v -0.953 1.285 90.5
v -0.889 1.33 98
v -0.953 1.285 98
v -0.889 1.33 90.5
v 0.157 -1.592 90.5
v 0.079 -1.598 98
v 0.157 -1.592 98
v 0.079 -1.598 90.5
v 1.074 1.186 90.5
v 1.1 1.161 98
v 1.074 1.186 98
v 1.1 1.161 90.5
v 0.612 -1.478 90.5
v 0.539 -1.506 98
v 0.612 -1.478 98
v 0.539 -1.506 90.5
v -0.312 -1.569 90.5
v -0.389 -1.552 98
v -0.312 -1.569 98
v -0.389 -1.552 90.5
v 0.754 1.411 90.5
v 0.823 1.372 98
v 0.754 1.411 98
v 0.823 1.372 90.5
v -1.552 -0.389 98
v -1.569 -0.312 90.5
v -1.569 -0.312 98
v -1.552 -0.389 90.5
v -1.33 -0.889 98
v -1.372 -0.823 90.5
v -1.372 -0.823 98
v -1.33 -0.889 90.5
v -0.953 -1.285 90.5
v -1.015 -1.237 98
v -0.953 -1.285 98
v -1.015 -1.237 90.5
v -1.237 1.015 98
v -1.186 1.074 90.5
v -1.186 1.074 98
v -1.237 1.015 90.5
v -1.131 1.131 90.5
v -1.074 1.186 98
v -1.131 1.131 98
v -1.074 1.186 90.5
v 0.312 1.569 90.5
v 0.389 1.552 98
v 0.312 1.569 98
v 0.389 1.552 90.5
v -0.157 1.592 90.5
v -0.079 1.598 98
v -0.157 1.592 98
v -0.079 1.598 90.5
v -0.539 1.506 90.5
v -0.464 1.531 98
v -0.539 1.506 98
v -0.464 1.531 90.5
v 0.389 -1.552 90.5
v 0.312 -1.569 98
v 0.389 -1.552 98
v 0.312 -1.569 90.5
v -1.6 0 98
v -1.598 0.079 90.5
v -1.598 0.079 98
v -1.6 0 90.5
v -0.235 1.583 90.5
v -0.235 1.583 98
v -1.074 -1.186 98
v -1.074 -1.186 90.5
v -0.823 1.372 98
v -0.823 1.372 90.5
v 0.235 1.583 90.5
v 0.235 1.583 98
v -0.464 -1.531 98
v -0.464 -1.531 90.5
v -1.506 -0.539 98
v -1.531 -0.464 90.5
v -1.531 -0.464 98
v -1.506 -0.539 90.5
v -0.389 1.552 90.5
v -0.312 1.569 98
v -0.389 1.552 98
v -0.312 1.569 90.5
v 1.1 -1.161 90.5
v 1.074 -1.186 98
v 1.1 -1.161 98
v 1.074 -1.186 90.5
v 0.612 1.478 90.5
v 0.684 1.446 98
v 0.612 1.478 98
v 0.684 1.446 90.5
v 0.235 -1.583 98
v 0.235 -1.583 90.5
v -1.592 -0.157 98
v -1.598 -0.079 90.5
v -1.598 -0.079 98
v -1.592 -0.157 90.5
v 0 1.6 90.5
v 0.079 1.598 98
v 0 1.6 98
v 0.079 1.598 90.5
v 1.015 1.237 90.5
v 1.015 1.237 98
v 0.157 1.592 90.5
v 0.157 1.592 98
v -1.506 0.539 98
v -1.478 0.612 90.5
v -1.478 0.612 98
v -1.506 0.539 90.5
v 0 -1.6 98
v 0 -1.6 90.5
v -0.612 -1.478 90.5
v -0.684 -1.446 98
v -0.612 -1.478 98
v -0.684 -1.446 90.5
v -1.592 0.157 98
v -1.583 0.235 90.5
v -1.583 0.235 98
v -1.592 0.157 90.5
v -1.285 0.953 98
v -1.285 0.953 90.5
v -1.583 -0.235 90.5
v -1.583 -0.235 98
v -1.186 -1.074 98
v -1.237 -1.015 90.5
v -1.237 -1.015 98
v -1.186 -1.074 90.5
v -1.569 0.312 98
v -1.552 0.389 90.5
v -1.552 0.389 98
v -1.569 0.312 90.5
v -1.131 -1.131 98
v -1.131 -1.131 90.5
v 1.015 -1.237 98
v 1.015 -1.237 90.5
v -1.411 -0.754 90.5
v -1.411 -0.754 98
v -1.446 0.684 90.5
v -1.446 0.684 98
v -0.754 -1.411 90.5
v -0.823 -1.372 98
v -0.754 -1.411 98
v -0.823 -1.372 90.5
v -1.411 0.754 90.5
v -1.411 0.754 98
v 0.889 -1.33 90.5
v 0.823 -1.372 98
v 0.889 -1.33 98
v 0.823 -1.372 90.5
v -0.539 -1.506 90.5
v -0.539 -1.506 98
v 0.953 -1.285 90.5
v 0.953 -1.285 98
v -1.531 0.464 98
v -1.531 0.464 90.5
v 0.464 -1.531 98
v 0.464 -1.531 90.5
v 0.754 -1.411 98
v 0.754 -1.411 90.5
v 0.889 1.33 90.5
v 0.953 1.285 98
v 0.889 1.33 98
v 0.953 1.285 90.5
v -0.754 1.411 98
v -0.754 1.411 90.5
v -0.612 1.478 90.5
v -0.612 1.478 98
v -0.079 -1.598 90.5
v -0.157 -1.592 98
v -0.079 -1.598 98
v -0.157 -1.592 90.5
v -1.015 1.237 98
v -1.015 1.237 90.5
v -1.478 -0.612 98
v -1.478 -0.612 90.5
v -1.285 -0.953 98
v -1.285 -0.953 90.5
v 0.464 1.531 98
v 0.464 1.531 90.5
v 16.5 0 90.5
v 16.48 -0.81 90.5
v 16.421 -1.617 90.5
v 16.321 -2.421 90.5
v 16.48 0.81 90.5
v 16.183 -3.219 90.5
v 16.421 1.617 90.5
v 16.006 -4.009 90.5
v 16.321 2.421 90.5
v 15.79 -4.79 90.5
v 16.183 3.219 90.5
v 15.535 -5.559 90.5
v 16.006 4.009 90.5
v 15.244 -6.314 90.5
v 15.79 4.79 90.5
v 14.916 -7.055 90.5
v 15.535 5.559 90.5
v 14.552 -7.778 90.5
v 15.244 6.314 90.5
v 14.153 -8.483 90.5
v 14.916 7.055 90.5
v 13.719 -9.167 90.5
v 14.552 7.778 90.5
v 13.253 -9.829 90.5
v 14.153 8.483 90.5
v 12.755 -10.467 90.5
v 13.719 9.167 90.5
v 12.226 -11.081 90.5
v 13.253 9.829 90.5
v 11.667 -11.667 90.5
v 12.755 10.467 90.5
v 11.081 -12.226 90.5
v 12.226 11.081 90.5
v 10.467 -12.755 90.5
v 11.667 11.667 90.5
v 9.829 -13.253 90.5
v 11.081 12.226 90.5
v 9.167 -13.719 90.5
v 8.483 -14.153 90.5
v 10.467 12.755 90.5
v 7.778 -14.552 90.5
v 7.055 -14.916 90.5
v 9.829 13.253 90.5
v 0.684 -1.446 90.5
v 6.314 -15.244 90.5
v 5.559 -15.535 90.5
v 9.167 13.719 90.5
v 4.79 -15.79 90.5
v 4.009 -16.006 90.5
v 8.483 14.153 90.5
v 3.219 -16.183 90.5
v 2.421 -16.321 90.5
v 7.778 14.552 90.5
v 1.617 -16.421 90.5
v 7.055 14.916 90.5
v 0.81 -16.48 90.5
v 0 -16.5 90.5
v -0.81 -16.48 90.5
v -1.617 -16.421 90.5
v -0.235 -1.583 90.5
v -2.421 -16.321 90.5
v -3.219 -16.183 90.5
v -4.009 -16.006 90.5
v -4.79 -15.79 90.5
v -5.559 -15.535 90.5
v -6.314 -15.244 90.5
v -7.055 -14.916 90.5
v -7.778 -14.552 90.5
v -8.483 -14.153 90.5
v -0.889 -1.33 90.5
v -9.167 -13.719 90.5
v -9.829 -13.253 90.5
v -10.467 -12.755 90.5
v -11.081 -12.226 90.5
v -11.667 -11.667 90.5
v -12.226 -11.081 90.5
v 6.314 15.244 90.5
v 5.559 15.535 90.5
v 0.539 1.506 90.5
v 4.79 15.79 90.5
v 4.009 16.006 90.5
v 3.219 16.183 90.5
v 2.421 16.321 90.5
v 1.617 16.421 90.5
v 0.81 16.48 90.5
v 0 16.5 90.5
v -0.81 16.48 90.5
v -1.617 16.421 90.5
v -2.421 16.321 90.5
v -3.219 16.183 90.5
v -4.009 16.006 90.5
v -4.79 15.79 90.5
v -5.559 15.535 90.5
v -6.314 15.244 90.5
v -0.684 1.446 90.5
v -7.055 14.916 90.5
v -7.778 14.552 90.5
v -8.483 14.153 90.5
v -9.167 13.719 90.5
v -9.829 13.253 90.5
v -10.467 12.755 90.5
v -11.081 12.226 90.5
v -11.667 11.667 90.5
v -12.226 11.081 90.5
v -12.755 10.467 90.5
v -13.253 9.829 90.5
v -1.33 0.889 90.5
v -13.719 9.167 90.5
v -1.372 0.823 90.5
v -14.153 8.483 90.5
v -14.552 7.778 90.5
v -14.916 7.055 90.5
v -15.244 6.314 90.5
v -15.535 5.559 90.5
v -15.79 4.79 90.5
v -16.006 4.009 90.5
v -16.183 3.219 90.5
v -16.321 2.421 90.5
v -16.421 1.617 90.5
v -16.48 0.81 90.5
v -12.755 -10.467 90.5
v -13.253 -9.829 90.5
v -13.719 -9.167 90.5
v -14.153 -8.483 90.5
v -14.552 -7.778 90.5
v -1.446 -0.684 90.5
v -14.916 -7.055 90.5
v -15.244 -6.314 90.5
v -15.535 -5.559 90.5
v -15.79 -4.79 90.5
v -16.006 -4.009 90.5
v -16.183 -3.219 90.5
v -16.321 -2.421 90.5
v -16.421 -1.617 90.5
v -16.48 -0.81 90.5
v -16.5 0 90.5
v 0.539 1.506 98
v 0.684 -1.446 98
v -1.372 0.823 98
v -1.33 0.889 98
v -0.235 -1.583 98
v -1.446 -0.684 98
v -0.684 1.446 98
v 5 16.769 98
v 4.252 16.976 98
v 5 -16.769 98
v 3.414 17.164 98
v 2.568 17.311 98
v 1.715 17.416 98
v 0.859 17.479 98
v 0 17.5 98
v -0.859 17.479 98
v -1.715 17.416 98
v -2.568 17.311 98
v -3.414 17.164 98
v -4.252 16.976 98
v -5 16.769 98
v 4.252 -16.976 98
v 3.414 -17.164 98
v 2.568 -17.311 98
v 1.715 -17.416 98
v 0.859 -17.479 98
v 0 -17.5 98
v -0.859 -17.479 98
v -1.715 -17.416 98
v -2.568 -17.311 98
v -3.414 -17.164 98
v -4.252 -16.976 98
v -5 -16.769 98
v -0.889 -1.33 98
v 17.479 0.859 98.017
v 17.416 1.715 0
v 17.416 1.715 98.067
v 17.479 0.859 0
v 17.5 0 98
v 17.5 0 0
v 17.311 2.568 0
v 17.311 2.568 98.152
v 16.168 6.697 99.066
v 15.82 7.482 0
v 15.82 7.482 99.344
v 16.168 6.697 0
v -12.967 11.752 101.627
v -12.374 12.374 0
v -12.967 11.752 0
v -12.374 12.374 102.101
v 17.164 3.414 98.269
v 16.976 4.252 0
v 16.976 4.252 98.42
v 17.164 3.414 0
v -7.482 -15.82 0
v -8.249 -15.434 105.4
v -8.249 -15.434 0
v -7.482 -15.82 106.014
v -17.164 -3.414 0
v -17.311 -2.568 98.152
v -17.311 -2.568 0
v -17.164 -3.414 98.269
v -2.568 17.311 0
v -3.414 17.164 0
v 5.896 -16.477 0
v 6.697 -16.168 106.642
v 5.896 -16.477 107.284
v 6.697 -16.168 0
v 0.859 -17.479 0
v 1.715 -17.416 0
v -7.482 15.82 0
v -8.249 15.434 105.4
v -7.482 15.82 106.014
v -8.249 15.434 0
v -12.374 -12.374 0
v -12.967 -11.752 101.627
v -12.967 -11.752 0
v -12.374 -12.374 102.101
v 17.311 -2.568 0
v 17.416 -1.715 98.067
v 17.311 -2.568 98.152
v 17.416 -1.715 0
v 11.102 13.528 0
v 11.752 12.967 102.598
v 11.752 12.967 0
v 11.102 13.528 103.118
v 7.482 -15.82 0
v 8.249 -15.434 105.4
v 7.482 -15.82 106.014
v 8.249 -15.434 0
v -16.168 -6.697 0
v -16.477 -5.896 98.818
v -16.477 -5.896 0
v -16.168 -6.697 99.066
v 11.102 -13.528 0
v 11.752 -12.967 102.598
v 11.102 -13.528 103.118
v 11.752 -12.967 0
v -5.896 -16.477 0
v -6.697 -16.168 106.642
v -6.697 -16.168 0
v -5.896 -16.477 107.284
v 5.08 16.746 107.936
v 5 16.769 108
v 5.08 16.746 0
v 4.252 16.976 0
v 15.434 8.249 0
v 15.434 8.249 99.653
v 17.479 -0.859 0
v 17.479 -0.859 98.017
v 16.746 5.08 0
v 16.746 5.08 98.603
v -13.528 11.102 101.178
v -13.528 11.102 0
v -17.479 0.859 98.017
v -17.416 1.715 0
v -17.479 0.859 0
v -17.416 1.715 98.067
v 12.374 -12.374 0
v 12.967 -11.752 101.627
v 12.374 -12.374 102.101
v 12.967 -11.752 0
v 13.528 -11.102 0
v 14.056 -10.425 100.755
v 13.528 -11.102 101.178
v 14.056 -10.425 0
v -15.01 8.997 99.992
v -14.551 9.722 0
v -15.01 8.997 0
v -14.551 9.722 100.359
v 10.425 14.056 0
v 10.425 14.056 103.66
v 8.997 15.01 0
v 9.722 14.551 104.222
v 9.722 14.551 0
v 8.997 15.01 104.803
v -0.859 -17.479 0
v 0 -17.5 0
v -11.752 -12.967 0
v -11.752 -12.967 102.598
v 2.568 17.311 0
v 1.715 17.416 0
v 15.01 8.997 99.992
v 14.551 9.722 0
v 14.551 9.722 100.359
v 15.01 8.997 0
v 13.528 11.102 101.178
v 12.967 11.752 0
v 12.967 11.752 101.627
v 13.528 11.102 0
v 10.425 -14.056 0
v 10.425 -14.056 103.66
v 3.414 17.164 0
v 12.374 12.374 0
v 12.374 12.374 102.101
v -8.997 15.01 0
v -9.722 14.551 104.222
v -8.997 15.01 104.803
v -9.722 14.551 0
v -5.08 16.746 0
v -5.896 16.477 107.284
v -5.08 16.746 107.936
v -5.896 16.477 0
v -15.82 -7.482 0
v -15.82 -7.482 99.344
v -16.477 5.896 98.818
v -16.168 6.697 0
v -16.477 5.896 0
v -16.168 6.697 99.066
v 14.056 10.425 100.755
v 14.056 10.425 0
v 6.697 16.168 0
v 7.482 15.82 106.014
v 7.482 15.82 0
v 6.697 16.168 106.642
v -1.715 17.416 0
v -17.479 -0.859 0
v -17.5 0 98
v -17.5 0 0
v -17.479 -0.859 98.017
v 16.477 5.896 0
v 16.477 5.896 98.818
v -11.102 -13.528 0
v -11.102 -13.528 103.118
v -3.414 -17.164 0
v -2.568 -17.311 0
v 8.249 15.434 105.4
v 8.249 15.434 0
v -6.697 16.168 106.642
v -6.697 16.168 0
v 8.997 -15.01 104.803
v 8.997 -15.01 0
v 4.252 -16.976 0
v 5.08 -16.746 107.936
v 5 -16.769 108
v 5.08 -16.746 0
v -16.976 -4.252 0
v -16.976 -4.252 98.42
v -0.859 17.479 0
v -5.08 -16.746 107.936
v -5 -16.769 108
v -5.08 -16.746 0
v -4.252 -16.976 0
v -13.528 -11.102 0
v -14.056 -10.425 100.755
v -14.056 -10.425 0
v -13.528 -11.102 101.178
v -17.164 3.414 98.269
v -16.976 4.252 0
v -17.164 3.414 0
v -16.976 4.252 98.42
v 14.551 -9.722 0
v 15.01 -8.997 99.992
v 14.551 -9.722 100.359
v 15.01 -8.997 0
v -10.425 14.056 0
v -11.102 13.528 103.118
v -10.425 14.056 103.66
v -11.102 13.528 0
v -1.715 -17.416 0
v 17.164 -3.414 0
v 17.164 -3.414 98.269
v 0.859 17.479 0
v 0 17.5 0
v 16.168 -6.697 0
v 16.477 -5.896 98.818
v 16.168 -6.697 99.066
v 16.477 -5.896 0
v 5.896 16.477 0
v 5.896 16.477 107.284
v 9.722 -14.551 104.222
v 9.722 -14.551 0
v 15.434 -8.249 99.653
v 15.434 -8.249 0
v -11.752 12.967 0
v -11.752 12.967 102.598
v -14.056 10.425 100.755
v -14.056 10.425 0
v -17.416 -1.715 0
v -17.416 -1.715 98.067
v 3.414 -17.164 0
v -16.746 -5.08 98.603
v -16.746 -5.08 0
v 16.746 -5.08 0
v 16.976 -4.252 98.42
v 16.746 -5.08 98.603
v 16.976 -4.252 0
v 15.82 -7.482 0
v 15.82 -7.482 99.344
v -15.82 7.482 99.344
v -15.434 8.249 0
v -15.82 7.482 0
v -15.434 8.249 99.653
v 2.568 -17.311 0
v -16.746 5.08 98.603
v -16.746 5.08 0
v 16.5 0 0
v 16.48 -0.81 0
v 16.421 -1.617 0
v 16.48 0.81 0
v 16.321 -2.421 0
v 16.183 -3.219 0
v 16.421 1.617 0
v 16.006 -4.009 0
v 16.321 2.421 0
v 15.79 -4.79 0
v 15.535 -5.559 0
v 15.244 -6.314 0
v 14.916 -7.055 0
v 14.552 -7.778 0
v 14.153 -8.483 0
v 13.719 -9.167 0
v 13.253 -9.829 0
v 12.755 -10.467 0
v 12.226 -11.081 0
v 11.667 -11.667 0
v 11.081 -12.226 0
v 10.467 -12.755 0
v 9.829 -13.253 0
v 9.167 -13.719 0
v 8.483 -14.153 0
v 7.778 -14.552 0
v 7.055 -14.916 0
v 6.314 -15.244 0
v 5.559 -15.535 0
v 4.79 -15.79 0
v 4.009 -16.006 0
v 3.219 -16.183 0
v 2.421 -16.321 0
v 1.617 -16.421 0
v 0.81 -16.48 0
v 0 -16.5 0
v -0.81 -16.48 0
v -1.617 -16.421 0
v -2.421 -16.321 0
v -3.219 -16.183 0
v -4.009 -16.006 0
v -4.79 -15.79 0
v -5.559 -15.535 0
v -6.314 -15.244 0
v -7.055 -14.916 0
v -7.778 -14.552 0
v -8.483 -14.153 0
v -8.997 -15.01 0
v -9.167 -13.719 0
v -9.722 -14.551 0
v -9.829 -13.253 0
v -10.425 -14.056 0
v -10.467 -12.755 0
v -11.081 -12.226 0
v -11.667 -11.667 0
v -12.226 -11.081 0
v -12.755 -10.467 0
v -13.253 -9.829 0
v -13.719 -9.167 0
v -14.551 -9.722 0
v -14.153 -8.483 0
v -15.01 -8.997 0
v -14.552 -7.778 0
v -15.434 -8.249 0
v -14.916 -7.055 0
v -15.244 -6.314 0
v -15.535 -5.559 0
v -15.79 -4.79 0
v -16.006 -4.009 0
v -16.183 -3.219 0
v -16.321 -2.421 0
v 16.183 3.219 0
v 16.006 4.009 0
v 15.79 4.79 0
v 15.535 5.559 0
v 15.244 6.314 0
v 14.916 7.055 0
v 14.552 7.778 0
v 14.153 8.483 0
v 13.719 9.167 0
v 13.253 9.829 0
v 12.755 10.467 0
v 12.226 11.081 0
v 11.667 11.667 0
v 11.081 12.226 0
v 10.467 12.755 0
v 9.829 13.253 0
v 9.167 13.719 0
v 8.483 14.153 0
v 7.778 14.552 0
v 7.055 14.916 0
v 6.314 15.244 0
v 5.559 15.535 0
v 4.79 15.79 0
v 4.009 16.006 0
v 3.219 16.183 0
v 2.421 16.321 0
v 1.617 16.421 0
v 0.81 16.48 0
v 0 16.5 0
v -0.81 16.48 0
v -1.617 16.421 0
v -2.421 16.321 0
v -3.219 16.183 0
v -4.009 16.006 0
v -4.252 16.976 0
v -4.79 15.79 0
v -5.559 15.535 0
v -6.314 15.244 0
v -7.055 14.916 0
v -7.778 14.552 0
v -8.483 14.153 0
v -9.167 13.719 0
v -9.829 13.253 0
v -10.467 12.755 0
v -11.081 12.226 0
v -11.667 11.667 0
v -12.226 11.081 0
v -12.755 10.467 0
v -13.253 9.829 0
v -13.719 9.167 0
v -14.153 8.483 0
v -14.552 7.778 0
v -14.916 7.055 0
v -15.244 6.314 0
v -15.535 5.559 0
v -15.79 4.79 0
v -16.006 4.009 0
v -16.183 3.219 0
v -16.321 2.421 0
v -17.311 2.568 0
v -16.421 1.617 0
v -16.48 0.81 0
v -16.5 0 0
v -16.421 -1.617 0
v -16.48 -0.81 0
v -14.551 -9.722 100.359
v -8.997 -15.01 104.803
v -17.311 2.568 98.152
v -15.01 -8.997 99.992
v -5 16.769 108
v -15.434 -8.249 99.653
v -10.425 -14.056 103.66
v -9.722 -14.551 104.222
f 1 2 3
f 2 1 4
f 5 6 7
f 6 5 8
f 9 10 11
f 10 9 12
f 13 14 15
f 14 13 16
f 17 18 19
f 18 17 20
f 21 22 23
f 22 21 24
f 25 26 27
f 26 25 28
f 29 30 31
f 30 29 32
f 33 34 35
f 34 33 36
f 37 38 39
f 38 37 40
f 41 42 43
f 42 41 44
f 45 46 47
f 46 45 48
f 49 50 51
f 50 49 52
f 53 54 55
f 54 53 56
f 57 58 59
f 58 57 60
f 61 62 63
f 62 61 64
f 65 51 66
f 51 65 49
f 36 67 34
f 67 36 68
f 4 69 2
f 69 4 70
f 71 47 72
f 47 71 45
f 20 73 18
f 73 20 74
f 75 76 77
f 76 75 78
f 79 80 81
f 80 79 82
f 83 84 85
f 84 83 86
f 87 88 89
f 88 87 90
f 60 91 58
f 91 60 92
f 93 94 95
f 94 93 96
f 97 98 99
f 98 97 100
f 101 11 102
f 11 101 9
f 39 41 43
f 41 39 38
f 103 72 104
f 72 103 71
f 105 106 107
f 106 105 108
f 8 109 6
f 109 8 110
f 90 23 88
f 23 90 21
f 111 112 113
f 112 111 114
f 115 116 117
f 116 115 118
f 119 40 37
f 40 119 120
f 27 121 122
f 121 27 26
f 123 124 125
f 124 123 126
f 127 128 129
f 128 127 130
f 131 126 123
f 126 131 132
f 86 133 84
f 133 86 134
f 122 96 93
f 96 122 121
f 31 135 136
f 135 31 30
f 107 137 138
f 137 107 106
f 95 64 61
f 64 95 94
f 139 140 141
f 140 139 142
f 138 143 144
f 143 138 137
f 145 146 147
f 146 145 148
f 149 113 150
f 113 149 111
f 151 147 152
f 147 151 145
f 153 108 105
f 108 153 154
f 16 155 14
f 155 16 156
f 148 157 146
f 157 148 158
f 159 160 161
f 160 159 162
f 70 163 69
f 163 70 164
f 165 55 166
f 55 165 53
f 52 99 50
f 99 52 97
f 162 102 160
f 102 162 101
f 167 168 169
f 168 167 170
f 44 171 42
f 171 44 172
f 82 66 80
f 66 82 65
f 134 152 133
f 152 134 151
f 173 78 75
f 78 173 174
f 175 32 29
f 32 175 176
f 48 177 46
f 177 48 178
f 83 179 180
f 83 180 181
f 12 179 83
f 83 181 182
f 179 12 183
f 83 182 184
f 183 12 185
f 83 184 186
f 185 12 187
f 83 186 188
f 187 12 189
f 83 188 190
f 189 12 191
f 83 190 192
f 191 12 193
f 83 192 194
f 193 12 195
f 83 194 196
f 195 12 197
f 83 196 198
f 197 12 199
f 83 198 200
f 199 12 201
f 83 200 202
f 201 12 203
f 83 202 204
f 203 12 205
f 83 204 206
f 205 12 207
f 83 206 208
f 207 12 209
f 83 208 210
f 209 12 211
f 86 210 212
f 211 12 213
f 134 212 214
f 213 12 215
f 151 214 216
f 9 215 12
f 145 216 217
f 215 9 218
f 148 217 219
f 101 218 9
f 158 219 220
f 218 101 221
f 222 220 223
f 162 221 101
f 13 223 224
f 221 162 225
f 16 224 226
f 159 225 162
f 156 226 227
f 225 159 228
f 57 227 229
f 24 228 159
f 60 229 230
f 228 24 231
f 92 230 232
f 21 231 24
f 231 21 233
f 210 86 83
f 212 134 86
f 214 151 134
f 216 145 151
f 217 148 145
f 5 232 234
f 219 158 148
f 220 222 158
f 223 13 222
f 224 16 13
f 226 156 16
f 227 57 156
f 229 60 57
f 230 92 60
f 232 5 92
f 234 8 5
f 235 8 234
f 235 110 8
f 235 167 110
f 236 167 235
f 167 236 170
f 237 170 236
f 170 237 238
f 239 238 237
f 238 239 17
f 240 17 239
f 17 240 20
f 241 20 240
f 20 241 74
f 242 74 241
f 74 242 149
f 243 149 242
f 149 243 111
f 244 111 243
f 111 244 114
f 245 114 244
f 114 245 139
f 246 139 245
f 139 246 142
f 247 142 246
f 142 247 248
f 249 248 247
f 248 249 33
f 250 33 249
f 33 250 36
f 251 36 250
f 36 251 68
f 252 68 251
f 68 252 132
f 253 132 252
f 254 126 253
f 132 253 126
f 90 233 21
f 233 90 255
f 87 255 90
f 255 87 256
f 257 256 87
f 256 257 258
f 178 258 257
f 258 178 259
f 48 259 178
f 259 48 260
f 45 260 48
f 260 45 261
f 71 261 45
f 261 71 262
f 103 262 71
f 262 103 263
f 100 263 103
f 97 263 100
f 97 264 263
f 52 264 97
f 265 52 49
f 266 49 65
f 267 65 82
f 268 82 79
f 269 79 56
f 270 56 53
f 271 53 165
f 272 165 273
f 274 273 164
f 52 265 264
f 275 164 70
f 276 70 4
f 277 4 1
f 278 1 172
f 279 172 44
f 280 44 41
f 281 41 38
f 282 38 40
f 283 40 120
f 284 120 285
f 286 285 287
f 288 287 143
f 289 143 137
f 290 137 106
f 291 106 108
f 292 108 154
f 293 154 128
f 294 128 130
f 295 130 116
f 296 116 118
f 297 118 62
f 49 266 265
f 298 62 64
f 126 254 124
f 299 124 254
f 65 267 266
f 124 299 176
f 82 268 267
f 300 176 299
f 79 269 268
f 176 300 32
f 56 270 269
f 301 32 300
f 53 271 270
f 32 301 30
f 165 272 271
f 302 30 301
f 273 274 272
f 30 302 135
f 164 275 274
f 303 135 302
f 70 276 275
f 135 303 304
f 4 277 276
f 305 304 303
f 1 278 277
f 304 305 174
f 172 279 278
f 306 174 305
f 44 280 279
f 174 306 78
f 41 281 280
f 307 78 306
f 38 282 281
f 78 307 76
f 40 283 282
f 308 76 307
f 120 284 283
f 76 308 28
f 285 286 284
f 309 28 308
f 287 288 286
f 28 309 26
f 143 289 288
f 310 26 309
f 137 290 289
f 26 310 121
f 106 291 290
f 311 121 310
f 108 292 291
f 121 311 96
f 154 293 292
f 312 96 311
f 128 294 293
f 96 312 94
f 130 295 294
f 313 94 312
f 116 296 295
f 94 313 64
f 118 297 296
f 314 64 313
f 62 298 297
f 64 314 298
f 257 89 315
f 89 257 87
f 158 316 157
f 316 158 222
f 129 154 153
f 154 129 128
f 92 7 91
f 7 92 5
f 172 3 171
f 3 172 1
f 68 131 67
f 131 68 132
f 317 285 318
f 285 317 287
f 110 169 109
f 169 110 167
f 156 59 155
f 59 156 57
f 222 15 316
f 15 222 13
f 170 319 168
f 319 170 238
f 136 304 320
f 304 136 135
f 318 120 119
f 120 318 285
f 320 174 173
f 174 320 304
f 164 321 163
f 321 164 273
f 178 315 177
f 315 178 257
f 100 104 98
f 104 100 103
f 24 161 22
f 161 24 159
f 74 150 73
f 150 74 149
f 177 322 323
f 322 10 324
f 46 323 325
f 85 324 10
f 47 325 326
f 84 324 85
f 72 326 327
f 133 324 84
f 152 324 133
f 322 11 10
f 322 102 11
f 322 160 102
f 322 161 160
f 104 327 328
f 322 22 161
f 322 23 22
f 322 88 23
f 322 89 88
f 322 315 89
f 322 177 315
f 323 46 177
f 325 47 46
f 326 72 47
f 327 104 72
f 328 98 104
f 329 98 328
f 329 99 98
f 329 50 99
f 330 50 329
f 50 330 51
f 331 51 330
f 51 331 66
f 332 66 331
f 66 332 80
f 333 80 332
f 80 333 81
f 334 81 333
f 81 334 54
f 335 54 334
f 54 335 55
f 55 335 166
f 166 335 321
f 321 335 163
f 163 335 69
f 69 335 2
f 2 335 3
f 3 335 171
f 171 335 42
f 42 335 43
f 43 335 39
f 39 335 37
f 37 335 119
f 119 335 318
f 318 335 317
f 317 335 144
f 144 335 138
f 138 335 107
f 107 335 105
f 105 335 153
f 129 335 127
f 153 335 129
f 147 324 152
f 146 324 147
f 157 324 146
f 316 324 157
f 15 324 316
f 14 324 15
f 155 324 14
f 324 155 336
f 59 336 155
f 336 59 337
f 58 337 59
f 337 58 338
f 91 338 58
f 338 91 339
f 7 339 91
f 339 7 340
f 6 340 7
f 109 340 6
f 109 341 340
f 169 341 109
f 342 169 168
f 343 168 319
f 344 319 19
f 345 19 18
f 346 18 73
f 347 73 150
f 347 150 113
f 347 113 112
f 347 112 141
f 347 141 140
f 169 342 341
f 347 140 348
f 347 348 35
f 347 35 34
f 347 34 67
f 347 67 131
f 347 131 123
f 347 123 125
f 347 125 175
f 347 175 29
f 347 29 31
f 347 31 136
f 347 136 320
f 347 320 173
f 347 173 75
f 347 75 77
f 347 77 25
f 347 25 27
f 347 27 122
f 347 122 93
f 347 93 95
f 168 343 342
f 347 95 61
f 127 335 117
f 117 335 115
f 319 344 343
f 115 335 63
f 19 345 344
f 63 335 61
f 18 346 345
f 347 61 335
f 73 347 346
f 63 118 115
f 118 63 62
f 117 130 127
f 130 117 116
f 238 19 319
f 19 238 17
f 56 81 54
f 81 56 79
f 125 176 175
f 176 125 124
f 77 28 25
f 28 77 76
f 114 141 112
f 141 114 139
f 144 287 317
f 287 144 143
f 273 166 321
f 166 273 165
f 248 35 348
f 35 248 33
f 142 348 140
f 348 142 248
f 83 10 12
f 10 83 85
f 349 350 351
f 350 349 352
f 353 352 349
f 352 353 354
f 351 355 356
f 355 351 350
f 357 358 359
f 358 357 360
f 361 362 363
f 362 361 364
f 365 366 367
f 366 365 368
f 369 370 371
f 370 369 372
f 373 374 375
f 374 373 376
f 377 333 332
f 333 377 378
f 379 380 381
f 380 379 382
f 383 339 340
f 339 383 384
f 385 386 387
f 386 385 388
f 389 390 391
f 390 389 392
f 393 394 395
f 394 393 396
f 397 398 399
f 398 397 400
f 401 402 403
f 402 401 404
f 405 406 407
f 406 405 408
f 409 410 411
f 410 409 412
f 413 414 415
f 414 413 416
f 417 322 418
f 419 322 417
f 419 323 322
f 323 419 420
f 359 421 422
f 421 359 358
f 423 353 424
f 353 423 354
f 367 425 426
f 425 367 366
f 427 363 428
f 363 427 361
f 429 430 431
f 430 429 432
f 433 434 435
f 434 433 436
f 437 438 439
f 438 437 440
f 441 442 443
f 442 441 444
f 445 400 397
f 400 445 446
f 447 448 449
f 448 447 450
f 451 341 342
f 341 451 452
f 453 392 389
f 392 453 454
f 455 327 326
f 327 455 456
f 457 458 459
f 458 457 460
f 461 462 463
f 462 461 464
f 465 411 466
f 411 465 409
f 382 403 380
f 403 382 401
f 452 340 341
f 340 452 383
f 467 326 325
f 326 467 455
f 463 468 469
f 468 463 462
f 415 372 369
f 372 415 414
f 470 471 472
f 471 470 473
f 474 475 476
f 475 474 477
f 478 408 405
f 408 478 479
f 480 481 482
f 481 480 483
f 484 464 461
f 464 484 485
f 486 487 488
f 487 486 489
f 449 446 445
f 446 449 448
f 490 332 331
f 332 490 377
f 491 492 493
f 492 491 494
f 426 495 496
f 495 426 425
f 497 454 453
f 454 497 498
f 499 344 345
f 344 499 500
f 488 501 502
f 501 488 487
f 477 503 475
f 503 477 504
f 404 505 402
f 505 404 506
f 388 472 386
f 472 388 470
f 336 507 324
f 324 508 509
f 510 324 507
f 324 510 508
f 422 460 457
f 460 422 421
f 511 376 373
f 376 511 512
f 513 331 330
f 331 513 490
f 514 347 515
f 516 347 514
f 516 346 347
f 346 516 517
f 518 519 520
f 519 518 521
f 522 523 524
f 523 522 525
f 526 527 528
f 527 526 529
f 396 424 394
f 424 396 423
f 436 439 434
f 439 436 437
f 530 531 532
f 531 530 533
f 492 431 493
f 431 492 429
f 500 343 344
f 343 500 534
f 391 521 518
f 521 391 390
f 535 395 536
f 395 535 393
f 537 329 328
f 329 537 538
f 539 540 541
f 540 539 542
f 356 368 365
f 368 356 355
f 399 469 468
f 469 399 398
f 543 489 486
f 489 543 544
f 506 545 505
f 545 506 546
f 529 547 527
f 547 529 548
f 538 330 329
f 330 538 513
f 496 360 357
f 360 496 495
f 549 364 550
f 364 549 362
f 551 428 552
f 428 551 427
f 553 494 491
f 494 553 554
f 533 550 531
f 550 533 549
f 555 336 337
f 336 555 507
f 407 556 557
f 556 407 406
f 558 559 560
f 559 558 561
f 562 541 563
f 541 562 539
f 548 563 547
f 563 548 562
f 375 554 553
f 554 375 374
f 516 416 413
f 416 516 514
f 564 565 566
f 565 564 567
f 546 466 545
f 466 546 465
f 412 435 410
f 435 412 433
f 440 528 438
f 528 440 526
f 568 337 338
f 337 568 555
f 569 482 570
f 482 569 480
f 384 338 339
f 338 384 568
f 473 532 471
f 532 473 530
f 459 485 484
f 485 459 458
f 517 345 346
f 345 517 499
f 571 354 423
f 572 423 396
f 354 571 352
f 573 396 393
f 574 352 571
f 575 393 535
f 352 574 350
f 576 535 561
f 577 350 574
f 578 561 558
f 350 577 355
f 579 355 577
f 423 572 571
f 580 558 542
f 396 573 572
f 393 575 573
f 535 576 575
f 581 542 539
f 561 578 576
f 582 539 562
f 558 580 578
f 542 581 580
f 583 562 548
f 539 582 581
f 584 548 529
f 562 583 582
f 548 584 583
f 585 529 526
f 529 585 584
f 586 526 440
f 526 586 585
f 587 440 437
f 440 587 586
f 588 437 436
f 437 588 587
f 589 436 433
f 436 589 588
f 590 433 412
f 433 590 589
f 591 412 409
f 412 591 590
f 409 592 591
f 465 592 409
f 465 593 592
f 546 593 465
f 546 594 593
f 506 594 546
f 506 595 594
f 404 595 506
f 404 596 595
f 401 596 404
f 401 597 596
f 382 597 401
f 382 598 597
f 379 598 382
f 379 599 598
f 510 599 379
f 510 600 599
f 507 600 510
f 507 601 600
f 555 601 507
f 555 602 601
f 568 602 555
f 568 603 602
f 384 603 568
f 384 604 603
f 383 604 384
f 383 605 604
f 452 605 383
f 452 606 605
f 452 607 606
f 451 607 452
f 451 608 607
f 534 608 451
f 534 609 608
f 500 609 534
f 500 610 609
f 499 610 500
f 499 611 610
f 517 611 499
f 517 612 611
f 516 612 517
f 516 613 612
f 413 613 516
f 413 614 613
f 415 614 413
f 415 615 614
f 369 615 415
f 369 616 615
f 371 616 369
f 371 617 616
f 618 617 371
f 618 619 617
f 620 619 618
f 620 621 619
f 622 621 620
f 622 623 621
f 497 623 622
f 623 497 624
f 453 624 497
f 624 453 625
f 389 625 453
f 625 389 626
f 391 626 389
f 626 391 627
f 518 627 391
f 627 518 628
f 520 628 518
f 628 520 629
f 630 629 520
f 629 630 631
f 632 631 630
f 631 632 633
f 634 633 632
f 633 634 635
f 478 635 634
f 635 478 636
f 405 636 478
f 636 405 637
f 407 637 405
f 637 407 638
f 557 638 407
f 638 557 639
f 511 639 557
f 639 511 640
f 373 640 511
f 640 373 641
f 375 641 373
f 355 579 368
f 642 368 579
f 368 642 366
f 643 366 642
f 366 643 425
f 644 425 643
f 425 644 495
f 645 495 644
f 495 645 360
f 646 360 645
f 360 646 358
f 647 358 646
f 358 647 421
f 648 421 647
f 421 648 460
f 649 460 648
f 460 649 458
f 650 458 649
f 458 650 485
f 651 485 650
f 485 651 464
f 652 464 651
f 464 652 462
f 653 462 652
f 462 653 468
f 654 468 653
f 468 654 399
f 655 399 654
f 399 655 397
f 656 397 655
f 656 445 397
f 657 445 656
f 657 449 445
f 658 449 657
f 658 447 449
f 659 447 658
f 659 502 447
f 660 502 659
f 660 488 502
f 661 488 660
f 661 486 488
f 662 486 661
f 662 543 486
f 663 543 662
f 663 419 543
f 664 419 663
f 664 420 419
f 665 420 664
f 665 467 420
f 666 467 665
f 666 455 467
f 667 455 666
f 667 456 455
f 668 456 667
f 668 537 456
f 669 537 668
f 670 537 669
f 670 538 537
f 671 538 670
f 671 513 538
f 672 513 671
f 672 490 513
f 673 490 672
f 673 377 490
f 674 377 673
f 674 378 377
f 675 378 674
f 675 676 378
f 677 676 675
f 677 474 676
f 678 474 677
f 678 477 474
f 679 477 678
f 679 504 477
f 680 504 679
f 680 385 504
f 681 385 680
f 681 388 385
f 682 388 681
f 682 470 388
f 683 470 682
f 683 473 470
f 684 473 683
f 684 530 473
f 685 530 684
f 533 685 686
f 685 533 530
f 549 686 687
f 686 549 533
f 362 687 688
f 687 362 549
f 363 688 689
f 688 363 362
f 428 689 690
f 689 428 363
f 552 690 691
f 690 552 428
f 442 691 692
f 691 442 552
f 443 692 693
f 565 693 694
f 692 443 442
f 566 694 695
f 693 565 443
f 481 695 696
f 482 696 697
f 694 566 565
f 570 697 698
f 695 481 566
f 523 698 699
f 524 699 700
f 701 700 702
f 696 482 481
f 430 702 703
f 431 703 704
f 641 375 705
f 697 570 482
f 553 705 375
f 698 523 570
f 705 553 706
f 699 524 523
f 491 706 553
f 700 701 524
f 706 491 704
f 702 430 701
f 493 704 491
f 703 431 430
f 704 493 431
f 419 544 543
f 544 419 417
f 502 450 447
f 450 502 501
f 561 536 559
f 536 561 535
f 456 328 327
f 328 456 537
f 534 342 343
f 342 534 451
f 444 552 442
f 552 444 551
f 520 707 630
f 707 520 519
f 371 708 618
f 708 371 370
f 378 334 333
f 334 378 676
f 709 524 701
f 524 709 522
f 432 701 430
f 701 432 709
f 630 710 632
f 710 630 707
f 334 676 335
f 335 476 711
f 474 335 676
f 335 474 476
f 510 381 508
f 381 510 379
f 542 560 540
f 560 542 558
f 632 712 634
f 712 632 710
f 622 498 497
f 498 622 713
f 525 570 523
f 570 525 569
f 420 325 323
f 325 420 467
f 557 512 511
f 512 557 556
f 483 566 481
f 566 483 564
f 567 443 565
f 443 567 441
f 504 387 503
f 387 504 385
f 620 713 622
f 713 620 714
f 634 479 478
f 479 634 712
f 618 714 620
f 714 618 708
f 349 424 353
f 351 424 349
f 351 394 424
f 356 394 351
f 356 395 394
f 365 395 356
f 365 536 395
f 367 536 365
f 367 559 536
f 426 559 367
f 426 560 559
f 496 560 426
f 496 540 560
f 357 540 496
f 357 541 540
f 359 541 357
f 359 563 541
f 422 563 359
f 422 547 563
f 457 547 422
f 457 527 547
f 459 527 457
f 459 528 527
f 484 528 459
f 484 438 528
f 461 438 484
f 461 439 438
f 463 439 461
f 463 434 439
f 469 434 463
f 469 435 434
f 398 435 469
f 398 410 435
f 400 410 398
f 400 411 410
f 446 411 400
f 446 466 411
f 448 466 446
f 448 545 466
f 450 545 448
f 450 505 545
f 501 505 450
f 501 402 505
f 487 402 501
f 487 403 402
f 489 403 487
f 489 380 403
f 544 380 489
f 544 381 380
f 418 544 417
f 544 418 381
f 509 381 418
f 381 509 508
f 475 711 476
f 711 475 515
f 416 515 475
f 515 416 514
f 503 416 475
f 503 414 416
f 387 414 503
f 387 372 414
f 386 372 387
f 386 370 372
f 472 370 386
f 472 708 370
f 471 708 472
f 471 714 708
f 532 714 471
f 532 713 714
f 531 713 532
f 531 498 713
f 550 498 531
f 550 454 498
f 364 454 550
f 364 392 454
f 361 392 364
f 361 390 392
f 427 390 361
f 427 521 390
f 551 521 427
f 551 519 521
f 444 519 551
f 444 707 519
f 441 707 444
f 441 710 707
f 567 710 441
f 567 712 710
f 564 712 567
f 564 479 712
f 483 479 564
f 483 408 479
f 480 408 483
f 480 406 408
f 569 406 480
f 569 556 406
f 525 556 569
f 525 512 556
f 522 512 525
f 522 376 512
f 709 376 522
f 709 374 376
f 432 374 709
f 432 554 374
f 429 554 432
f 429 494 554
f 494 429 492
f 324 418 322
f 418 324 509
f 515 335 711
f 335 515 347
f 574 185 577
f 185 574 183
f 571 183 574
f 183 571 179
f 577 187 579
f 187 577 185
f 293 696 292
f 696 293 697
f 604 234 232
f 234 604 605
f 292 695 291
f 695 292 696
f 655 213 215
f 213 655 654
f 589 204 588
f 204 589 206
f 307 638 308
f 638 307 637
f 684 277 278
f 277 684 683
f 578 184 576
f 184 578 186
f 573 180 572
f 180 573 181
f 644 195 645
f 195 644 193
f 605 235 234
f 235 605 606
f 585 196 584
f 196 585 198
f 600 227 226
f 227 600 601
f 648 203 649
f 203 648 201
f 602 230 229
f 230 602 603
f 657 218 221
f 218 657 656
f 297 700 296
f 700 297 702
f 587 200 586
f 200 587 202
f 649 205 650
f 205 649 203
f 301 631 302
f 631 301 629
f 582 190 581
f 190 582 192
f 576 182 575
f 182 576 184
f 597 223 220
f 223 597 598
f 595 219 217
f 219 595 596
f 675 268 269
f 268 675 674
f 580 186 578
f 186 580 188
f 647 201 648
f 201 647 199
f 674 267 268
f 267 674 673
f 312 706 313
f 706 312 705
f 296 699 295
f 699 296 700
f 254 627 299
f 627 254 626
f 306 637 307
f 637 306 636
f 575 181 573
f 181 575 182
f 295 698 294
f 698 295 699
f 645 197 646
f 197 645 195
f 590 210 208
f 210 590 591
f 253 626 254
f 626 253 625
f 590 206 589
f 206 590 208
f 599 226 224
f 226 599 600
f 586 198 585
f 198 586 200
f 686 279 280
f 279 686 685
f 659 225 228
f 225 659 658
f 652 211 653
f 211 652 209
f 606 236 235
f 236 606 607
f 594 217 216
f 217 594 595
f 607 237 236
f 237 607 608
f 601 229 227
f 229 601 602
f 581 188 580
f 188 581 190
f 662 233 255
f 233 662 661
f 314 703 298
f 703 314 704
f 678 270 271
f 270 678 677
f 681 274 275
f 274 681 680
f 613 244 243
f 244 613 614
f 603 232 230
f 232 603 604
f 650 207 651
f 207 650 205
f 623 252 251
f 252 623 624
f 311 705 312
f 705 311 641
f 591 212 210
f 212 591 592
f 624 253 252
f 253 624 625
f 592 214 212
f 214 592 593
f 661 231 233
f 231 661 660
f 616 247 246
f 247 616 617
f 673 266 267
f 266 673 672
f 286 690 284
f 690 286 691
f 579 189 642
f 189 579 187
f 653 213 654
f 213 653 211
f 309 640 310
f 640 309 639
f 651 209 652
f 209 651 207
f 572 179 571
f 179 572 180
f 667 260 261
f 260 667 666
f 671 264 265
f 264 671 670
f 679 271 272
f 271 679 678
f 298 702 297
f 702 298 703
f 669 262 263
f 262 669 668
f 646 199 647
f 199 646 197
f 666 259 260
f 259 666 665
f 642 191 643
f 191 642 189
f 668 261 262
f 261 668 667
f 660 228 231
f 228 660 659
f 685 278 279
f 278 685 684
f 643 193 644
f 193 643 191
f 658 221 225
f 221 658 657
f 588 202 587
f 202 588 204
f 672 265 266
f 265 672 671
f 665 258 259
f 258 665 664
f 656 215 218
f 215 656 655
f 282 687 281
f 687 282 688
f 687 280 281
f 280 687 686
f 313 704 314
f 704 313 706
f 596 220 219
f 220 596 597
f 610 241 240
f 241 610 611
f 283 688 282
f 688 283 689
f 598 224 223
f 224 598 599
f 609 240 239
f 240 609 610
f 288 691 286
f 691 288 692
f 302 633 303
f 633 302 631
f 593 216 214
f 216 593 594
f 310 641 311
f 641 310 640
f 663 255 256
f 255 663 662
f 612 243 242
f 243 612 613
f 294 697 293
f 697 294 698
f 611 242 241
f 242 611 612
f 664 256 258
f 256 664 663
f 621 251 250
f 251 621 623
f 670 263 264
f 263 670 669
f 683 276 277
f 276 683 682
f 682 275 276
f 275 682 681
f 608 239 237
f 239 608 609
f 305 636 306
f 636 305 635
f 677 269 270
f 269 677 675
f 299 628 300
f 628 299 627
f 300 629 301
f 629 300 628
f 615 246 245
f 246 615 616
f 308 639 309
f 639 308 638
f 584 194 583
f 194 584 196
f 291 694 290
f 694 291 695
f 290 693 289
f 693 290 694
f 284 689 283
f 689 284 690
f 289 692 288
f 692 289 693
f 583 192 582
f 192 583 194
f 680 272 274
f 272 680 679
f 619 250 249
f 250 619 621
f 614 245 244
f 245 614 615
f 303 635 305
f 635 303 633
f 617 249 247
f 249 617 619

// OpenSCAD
$fn=128;

ph = 10; // notch height
eh = 10; // notch width 
di = 33; // inner dia
thh = 90.5; // inner height
ah = 7.5; // motor axle height
ad = 3.2; // axle dia
ac = 0.5; //axle cut
wt = 1; // wall thickness
totalh = ph + ah + thh;
do = di + 2*wt;

difference() {
    translate([0, 0, thh]) difference() {
        translate([0,0, -thh]) color("#FF00FF") rotate([0, 0, 0]) cylinder(totalh, d=do);
        translate([0, do/2, ah]) rotate([90, 0, 0]) linear_extrude(height=do) polygon([[do/2, 0], [do/2, ph], [eh/2, ph]]);
        translate([0, do/2, ah]) rotate([90, 0, 0]) linear_extrude(height=do) polygon([[-do/2, 0], [-do/2, ph], [-eh/2, ph]]);
        translate([-eh / 2,-do / 2, ah]) cube([eh, do, eh]);
        difference() {
            cylinder(ah, d=ad);
            translate([ad/2  - ac, -ad, 0]) cube([ac, ad * 2, ah]);
        }
    }
    translate([0,0,0]) color("blue") rotate([0, 0, 0]) cylinder(thh, d=di);
}
